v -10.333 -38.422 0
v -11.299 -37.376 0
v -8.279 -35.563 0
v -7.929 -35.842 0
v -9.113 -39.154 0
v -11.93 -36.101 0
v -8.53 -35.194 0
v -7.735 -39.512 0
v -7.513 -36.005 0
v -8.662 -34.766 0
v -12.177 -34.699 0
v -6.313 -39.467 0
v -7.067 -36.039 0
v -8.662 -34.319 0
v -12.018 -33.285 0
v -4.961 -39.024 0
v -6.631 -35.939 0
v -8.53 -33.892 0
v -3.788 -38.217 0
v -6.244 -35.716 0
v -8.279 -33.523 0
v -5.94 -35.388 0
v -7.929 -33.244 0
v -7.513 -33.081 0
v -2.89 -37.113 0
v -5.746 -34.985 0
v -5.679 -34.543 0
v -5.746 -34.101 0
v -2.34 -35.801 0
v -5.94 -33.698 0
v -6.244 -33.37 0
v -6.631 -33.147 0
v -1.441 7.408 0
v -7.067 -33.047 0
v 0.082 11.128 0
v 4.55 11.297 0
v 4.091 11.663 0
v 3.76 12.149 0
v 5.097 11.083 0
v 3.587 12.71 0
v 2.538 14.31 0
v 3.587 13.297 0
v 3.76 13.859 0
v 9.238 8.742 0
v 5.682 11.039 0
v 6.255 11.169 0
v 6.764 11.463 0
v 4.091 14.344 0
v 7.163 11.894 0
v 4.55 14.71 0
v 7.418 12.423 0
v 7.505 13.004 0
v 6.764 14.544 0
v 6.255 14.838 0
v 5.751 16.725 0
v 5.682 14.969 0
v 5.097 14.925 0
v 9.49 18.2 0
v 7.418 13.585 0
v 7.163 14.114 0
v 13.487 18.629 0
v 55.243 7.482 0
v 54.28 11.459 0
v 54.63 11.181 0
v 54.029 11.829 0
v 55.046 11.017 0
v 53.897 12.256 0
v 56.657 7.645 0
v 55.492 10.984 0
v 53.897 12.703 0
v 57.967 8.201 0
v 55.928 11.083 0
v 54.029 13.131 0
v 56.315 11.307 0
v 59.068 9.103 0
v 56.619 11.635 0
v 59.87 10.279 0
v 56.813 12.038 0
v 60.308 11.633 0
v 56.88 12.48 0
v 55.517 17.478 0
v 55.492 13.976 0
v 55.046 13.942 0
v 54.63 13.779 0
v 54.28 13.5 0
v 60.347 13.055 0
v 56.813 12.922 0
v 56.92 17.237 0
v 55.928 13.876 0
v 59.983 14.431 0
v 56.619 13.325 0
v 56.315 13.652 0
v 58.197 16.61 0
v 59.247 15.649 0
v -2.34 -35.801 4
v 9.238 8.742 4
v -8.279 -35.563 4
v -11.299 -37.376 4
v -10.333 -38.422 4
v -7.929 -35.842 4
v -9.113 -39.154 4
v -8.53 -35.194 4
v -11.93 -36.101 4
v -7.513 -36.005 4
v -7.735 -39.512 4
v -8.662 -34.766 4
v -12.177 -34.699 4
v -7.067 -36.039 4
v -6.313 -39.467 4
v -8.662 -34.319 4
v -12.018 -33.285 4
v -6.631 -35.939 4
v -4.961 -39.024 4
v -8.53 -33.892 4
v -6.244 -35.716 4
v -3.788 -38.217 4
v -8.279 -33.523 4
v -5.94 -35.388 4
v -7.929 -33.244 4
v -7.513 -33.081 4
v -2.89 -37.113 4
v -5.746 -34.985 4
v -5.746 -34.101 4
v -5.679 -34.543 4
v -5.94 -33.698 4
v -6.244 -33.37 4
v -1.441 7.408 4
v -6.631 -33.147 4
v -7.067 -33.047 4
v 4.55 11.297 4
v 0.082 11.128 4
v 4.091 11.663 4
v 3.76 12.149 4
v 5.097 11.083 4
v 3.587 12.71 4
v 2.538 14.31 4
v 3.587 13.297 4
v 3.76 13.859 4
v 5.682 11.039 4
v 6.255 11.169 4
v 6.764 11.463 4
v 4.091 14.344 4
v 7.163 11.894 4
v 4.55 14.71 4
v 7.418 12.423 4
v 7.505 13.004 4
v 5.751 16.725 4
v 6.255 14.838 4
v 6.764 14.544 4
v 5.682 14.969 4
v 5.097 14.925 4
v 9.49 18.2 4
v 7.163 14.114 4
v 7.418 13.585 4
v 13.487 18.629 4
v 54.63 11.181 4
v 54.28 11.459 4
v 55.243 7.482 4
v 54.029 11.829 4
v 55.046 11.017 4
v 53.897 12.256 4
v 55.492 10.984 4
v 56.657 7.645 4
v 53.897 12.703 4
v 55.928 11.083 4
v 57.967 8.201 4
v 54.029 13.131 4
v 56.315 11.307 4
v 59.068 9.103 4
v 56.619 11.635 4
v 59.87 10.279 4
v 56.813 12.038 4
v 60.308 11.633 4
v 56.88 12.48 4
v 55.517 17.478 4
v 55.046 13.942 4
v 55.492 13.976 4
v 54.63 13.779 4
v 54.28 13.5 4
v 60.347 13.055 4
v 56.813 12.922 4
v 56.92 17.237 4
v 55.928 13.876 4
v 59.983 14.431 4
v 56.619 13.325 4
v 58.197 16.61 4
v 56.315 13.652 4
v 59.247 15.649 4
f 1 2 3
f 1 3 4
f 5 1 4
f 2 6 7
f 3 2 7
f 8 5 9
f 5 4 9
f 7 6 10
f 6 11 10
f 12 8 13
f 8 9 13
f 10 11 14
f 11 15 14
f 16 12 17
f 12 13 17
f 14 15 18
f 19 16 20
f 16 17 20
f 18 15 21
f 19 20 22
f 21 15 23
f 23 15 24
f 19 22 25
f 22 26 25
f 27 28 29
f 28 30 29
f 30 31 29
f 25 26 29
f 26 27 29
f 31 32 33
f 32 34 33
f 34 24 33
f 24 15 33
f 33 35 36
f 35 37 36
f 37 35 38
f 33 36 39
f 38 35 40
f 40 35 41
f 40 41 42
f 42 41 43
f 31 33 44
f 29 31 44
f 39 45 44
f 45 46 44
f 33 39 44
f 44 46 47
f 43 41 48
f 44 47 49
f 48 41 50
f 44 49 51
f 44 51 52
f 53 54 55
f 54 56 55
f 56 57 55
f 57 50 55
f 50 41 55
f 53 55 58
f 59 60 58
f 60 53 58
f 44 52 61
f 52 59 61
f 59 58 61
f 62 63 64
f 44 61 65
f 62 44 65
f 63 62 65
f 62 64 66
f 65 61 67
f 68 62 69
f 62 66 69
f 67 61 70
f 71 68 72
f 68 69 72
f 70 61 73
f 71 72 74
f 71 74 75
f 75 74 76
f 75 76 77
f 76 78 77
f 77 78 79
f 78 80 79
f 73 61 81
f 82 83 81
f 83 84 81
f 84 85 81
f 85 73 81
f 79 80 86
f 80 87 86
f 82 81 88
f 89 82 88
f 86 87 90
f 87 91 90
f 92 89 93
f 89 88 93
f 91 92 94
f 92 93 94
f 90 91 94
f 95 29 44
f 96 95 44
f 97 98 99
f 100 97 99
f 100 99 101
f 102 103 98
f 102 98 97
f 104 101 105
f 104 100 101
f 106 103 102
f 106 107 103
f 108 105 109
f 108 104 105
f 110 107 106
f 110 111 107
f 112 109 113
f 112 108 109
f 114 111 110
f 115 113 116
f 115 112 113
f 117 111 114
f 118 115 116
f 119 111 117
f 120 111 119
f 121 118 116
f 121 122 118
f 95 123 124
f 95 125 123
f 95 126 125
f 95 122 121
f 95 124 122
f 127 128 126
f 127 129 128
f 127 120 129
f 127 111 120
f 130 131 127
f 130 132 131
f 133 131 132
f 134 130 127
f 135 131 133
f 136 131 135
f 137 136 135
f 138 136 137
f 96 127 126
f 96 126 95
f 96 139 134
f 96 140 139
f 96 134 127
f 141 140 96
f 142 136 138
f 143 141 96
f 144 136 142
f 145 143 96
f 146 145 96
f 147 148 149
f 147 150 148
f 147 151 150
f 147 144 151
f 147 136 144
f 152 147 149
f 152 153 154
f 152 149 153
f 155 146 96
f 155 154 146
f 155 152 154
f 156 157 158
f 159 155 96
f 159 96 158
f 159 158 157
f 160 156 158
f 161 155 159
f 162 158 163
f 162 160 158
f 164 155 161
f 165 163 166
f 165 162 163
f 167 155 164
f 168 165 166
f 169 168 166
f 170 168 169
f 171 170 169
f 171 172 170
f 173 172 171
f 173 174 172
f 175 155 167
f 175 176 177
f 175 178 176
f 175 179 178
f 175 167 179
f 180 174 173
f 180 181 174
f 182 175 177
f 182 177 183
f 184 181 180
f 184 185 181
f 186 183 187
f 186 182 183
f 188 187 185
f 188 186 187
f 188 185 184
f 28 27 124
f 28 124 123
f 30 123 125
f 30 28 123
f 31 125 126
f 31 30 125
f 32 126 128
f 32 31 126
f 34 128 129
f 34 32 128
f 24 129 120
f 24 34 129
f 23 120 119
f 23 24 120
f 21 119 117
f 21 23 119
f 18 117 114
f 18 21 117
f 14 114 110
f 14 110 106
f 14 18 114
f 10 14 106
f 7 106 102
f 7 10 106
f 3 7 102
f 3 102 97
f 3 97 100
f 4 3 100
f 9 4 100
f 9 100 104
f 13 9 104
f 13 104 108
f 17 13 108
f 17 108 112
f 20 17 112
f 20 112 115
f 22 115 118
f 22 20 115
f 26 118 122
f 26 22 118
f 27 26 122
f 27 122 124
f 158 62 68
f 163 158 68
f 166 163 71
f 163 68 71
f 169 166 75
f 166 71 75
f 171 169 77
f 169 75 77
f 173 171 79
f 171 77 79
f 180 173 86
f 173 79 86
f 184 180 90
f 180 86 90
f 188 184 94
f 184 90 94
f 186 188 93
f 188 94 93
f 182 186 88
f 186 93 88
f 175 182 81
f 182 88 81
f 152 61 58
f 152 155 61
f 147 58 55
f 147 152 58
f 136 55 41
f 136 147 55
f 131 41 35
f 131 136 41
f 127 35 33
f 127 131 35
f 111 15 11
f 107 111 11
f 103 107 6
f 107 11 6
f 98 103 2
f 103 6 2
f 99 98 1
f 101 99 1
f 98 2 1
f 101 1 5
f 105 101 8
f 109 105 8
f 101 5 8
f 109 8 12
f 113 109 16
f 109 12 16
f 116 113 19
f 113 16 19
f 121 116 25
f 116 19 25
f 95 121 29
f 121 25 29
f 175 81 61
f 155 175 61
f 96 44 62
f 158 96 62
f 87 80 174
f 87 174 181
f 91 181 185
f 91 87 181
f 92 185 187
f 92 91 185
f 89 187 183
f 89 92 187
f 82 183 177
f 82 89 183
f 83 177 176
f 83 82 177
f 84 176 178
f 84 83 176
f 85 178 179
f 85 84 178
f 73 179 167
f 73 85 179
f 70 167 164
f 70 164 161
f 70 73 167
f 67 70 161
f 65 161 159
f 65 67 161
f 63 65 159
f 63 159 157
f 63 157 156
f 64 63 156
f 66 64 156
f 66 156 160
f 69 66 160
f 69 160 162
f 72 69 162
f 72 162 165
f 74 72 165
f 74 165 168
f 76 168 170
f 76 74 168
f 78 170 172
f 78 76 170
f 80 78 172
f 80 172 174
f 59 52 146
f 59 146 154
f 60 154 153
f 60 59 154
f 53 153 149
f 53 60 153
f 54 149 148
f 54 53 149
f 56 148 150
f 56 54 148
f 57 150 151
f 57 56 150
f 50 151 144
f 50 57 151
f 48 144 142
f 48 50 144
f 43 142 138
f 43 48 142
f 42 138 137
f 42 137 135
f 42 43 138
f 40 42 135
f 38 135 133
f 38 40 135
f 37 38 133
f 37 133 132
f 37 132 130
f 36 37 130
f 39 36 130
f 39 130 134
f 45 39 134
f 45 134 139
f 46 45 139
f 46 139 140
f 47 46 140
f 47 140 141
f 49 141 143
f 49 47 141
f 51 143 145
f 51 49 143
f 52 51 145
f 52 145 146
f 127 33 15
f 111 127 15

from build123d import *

# Parameters (mm, degrees)
ESQUISSE1_R        = 1.970435897
ESQUISSE1_R_2      = 1.5
BOSS_EXTRU_1_DEPTH = 4
CONG_1_R           = 15


with BuildPart() as part:
    # Esquisse1 → Boss.-Extru.1 (new body)
    with BuildSketch(Plane.XY):
        with BuildLine():
            Line((55.516963126, 17.477838302), (1.560034717, 18.956280867))
            Line((1.560034717, 18.956280867), (-12.018183396, -33.285157749))
            ThreePointArc((-12.018183396, -33.285157749), (-8.436742053, -39.382146998), (-2.339752804, -35.800705656))
            Line((-2.339752804, -35.800705656), (9.237508154, 8.74216165))
            Line((9.237508154, 8.74216165), (55.243061715, 7.481590105))
            ThreePointArc((55.243061715, 7.481590105), (60.378136519, 12.342763498), (55.516963126, 17.477838302))
        make_face()
        with Locations((5.534972738, 13.003723761)):
            Circle(ESQUISSE1_R, mode=Mode.SUBTRACT)
        with Locations((-7.1789681, -34.542931702)):
            Circle(ESQUISSE1_R_2, mode=Mode.SUBTRACT)
        with Locations((55.380012421, 12.479714203)):
            Circle(ESQUISSE1_R_2, mode=Mode.SUBTRACT)
    extrude(amount=BOSS_EXTRU_1_DEPTH)

    # Congé1
    cong_1_edges = [part.edges().sort_by_distance(p)[0] for p in [
        (1.560034717, 18.956280867, 2),
    ]]
    fillet(cong_1_edges, radius=CONG_1_R)


solid = part.part
